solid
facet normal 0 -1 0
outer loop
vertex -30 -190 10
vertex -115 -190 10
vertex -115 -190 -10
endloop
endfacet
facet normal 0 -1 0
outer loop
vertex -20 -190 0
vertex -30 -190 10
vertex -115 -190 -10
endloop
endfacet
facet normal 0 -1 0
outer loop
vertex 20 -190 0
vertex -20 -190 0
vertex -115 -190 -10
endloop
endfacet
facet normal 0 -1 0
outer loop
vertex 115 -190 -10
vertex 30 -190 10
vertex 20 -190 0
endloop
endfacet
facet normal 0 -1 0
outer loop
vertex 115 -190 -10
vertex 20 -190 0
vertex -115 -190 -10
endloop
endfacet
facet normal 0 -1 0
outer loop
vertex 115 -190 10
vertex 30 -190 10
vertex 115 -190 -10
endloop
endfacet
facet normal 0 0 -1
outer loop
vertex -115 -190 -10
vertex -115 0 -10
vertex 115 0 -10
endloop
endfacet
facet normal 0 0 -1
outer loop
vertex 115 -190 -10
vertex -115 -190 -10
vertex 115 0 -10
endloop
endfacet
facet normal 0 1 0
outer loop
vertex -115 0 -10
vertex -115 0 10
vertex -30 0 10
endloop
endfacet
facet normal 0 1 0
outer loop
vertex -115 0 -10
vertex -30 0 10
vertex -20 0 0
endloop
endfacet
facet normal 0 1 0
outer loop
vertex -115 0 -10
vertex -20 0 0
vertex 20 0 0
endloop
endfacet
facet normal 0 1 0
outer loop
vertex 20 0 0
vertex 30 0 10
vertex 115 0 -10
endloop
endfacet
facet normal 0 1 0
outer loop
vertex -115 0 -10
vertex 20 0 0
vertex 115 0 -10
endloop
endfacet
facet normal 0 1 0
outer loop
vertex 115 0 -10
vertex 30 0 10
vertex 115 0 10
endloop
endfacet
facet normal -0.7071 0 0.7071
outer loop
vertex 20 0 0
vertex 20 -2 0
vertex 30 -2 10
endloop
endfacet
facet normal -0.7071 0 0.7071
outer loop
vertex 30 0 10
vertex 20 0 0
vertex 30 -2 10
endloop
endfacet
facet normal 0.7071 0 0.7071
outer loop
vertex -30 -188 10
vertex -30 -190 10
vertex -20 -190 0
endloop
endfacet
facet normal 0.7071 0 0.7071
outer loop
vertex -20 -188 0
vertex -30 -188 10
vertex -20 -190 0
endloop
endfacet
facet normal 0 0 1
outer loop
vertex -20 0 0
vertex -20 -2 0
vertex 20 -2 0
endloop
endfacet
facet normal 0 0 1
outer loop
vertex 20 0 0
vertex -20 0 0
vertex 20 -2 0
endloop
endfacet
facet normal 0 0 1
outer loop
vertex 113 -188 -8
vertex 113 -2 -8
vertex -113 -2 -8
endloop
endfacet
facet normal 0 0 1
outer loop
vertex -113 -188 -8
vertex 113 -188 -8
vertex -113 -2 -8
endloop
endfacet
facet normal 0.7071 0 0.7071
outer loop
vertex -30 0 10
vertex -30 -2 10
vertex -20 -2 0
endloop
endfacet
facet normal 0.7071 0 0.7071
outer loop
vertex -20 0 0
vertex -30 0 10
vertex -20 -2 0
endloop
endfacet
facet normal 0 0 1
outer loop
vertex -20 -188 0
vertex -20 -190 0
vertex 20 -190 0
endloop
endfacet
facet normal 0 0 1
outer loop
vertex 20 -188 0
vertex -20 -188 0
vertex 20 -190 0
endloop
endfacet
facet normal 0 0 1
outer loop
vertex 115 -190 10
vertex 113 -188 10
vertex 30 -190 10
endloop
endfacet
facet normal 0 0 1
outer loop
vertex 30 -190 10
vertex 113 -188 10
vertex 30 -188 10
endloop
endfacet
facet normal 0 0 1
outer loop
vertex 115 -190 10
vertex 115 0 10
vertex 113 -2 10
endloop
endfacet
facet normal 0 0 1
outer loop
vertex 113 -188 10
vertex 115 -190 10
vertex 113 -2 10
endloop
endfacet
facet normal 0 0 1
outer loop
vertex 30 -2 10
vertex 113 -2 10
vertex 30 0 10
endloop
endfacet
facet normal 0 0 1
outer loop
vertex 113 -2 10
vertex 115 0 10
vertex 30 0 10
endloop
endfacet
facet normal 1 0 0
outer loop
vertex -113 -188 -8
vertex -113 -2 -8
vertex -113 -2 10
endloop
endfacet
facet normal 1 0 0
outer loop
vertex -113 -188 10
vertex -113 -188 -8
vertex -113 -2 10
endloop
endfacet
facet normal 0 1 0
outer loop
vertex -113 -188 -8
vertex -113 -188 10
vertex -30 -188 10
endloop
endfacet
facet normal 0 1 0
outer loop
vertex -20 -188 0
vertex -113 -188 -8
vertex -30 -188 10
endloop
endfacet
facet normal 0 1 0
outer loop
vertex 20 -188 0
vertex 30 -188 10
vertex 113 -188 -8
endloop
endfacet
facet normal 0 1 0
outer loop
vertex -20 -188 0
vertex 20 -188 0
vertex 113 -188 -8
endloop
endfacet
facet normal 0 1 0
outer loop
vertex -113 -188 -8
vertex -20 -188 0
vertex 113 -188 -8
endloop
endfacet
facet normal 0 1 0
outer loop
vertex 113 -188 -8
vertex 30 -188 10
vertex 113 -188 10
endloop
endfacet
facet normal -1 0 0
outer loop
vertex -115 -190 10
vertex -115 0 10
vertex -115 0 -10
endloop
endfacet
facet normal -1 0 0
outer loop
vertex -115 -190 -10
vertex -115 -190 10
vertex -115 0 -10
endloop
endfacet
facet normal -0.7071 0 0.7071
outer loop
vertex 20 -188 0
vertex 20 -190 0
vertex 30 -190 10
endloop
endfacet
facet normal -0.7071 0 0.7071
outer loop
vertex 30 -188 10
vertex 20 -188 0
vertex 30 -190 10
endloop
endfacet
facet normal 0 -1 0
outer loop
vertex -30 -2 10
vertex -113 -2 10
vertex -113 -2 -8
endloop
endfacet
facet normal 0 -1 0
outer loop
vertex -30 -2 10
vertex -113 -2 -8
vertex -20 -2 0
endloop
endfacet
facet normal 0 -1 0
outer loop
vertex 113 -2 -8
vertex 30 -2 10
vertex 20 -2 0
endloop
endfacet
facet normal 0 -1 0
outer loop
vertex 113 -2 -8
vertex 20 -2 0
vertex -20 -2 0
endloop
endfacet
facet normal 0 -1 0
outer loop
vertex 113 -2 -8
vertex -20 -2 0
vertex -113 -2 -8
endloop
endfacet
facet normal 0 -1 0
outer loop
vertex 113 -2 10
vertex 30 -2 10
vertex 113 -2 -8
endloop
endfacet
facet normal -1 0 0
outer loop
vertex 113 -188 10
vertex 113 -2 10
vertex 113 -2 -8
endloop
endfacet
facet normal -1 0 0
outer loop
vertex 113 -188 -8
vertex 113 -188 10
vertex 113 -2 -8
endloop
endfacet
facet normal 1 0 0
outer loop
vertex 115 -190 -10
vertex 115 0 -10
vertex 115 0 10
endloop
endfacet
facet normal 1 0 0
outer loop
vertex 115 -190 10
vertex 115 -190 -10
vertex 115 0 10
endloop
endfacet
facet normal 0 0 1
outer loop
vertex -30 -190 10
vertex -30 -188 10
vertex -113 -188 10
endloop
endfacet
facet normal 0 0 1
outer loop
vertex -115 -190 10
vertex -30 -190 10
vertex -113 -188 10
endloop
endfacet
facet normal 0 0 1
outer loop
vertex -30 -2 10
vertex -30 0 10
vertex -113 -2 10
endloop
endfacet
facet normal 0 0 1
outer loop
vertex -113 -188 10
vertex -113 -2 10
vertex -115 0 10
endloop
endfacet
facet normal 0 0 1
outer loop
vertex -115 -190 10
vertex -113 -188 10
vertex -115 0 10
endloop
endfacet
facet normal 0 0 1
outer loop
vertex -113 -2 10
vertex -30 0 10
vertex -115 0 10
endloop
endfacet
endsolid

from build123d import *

# Parameters (mm, degrees)
F1_DEPTH = 190
F2_W     = 230
F2_H     = 20
F3_DEPTH = 2
F6_DEPTH = 190.001


# Not quite as in the source:
# - a pattern or mirror of a feature is missing from the dataset's text; its kind, count and spacing are read off the source's solid


with BuildPart() as f1:
    # F0 (on Front) → F1 (new body)
    with BuildSketch(Plane.XZ):
        Polygon((-115, 10), (-115, -10), (115, -10), (115, 10), (113, 10), (113, -8), (-113, -8), (-113, 10), align=None)
    extrude(amount=F1_DEPTH)

    # F2 (on face) → F3 (join)
    with BuildSketch(Plane.XZ.offset(190)):
        Rectangle(F2_W, F2_H)
    f3 = extrude(amount=-F3_DEPTH)

    # F3_copies: F3 across plane
    add(f3.mirror(Plane.ZX.offset(-95)))

    # F5 (on face) → F6 (cut, through all)
    with BuildSketch(Plane.XZ.offset(190)):
        Polygon((-20, 0), (0, 0), (20, 0), (30, 10), (0, 10), (-30, 10), align=None)
    extrude(amount=-F6_DEPTH, mode=Mode.SUBTRACT)


solid = f1.part
